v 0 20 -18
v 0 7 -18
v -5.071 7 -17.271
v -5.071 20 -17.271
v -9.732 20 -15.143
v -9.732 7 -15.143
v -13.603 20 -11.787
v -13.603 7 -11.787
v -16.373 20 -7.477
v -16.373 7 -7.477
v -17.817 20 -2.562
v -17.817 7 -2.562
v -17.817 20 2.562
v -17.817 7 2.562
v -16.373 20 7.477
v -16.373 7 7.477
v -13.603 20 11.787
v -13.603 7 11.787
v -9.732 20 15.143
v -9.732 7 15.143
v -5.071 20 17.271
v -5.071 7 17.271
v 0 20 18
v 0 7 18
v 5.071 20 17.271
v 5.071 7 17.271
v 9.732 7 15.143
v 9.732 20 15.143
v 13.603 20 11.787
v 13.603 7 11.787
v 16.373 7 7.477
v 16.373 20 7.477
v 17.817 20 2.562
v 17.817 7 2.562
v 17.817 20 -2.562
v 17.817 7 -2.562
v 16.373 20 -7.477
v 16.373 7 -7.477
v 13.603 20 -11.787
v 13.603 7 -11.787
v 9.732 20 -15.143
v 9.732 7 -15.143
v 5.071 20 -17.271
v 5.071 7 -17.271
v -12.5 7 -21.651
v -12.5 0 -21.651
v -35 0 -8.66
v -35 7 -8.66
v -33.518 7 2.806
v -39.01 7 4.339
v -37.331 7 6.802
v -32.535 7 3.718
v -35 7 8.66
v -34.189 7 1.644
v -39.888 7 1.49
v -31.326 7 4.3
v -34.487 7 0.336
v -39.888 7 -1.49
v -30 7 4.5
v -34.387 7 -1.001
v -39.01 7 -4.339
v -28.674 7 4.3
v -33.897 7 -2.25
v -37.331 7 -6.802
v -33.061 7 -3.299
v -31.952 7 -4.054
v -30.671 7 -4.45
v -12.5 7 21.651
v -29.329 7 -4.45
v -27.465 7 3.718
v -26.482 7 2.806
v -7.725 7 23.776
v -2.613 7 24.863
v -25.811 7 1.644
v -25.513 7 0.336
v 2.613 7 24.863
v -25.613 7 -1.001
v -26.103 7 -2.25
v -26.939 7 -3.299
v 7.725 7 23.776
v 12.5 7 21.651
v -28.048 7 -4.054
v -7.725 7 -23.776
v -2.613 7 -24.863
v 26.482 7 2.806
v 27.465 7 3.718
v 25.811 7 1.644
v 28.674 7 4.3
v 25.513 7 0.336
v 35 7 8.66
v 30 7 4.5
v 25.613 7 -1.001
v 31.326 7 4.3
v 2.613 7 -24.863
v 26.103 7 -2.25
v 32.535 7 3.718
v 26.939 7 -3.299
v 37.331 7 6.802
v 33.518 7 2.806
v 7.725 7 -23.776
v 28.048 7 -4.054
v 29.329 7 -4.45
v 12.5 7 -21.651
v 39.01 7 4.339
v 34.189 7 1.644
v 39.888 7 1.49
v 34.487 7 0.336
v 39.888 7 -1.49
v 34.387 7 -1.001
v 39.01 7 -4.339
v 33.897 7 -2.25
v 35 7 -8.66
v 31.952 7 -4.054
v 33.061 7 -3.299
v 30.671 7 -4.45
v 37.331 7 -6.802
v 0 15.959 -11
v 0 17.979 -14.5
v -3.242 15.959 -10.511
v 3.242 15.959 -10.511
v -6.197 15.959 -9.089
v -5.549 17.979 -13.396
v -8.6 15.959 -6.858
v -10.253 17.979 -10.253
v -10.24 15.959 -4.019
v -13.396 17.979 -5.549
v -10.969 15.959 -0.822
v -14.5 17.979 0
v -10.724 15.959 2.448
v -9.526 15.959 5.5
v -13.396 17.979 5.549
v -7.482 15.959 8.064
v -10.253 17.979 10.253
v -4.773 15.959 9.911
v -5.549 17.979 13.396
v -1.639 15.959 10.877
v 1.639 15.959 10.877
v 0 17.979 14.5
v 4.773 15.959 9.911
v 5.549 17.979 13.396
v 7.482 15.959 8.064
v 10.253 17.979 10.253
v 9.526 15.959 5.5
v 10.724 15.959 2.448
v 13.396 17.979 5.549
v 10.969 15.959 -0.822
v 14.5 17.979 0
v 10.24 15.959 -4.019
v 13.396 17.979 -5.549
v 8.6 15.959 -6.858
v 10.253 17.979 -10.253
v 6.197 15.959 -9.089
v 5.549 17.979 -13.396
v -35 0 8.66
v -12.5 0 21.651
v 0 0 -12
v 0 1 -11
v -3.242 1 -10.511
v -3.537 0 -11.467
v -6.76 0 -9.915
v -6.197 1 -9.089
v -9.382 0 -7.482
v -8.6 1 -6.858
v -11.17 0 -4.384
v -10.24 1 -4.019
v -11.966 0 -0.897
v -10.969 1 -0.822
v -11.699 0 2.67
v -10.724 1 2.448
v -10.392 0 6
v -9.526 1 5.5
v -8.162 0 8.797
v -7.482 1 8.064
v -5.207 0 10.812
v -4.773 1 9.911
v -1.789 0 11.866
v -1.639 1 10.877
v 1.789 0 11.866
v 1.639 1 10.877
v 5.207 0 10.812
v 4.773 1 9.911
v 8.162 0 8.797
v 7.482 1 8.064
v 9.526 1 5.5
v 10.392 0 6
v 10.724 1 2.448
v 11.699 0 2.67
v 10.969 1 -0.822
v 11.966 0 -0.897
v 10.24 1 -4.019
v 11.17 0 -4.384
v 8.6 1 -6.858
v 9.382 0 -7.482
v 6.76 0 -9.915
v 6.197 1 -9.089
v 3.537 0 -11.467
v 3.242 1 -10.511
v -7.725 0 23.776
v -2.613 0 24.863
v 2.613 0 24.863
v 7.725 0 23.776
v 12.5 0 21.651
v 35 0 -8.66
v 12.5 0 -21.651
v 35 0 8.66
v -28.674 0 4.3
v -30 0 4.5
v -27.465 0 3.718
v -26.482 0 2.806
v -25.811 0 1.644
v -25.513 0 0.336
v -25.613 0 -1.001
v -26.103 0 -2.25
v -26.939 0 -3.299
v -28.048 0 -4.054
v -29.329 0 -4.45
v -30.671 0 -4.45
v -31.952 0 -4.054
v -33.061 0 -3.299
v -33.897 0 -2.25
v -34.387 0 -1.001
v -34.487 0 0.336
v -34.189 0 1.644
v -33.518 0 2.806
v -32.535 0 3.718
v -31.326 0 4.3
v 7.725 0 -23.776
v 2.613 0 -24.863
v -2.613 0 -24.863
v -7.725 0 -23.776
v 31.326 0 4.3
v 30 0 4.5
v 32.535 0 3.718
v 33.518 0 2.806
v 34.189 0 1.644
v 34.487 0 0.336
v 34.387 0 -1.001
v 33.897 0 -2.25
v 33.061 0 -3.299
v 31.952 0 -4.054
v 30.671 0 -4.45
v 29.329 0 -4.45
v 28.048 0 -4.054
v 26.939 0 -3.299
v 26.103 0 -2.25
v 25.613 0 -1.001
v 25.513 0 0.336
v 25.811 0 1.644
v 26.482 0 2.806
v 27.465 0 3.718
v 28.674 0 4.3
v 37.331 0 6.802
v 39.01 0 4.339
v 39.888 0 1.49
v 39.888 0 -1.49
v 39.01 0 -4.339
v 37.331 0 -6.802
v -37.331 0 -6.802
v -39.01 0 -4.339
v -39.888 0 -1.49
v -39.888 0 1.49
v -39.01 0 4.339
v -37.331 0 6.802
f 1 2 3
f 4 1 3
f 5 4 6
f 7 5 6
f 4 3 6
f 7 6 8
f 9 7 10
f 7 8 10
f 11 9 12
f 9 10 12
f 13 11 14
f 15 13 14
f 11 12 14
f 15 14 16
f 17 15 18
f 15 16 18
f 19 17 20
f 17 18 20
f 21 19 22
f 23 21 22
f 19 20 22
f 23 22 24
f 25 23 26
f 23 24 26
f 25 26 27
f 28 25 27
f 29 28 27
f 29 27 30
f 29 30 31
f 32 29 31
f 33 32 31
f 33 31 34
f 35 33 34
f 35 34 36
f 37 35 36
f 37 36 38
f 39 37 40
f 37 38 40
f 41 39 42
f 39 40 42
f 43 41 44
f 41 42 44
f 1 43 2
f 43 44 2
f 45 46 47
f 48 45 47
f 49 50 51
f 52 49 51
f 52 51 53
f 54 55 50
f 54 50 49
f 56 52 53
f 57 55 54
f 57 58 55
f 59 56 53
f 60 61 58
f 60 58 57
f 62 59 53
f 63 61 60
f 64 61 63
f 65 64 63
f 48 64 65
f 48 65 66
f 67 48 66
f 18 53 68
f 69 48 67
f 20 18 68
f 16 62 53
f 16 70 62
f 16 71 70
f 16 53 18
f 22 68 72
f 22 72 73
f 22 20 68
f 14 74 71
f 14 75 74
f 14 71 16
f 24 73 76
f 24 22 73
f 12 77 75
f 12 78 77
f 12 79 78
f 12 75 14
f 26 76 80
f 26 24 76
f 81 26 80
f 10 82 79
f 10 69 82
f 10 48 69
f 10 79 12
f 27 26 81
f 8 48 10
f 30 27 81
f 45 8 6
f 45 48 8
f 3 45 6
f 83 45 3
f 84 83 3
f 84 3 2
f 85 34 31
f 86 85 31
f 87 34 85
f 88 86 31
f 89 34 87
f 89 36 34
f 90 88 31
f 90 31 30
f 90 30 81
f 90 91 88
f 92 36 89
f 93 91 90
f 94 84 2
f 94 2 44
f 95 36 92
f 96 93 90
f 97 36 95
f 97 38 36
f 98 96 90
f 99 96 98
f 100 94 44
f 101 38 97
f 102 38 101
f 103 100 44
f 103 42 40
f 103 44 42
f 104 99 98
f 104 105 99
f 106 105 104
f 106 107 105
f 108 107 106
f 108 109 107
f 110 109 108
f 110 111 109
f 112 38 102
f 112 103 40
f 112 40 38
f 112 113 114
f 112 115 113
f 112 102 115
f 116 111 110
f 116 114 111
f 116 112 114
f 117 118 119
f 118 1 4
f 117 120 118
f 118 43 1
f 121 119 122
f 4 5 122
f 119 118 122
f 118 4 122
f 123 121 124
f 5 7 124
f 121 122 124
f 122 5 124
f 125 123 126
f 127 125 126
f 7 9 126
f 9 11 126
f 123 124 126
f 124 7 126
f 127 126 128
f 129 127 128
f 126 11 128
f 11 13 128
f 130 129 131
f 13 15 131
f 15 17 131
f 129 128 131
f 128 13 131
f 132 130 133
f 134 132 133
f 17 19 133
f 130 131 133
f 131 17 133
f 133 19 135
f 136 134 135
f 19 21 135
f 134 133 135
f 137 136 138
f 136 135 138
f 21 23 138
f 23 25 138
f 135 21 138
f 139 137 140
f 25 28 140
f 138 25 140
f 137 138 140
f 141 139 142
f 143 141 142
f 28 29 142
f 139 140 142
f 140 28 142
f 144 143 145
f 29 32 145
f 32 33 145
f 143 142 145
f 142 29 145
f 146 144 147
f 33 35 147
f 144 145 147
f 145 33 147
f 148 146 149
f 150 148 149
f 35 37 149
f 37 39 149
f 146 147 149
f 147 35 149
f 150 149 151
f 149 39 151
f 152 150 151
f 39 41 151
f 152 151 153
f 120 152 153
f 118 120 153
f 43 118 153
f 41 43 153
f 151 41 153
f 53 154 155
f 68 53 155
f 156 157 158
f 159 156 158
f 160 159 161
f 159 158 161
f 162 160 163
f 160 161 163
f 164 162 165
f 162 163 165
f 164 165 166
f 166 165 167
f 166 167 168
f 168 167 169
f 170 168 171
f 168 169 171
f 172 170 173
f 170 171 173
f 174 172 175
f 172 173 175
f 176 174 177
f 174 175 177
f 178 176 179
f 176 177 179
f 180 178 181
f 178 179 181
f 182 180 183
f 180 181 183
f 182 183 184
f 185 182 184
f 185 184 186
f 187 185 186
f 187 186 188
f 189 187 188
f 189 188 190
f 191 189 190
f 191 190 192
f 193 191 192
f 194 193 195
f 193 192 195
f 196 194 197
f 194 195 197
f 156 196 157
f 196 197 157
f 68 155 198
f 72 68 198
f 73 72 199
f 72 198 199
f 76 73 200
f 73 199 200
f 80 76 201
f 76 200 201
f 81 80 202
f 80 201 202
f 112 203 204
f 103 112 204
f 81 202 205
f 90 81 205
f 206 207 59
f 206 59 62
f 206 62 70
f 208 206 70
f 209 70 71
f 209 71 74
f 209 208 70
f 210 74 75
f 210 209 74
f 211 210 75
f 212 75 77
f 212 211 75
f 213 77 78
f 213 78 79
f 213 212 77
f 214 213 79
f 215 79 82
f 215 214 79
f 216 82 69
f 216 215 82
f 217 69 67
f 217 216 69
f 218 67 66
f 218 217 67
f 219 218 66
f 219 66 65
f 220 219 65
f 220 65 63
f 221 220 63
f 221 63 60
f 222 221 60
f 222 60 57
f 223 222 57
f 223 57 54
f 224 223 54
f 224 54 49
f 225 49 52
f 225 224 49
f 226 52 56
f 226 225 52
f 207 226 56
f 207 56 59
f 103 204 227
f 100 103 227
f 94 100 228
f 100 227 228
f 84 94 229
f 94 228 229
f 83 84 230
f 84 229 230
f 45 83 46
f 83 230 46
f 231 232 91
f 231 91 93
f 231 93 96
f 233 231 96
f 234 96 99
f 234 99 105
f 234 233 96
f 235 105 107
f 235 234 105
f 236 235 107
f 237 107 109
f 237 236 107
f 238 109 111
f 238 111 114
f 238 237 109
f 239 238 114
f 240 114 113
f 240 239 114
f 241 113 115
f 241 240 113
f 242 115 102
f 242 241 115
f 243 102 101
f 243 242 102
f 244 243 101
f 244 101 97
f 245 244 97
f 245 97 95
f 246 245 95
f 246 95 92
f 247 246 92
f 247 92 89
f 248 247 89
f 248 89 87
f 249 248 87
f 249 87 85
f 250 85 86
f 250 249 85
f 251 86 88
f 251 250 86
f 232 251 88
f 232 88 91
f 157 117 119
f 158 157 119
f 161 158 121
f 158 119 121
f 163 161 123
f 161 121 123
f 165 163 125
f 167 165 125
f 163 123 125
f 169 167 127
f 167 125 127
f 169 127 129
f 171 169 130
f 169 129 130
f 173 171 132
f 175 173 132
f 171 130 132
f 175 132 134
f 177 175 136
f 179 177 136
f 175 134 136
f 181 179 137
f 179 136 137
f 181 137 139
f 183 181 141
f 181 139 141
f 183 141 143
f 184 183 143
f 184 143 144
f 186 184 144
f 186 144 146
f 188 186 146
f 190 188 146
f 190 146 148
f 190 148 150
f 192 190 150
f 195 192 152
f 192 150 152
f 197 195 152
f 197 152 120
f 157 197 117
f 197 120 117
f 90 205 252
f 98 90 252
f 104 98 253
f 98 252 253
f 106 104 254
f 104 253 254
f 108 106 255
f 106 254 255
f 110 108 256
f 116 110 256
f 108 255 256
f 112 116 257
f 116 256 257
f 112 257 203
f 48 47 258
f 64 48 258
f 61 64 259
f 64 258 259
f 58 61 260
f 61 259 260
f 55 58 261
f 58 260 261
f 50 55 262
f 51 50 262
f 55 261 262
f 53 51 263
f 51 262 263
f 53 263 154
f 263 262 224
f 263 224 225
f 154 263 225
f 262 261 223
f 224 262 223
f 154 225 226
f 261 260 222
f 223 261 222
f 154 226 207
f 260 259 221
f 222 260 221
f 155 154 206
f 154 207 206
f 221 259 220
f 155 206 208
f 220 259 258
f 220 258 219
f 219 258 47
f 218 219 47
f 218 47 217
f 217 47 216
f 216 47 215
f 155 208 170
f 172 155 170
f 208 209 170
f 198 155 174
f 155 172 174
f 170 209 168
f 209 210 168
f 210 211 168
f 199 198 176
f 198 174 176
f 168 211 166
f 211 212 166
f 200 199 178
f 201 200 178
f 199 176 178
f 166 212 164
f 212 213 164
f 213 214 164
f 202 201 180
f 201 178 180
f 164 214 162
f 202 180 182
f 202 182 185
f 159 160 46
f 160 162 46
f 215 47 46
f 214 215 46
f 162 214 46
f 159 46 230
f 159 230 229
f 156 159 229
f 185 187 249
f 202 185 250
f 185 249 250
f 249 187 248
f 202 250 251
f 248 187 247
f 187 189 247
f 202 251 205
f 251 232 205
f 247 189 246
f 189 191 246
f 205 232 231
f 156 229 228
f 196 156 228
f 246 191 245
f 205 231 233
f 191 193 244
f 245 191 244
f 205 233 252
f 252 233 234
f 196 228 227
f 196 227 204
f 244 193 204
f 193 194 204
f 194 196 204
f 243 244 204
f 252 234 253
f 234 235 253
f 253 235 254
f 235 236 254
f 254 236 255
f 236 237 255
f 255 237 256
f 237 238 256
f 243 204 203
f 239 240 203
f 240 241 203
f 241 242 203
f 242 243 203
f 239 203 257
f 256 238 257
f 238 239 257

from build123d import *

# Parameters (mm, degrees)
SKETCH_2_R      = 4.5
EXTRUDE_1_DEPTH = 7
SKETCH_3_R      = 18
EXTRUDE_2_DEPTH = 13
CHAMFER_1_SIZE  = 1


with BuildPart() as part:
    # 草图2 → 拉伸1 (new body)
    with BuildSketch(Plane(origin=(0, 0, 0), x_dir=(1, 0, 0), z_dir=(0, 1, 0))):
        with BuildLine():
            Line((-12.5, 21.650635095), (-35, 8.660254038))
            ThreePointArc((-35, 8.660254038), (-40, 0), (-35, -8.660254038))
            Line((-35, -8.660254038), (-12.5, -21.650635095))
            ThreePointArc((-12.5, -21.650635095), (0, -25), (12.5, -21.650635095))
            Line((12.5, -21.650635095), (35, -8.660254038))
            ThreePointArc((35, -8.660254038), (40, 0), (35, 8.660254038))
            Line((35, 8.660254038), (12.5, 21.650635095))
            ThreePointArc((12.5, 21.650635095), (0, 25), (-12.5, 21.650635095))
        make_face()
        with Locations(Location((-30, 0, 0), (0, 0, 270))):
            Circle(SKETCH_2_R, mode=Mode.SUBTRACT)
        with Locations(Location((30, 0, 0), (0, 0, 270))):
            Circle(SKETCH_2_R, mode=Mode.SUBTRACT)
    extrude(amount=EXTRUDE_1_DEPTH)

    # 草图3 → 拉伸2 (add)
    with BuildSketch(Plane(origin=(0, 7, 0), x_dir=(1, 0, 0), z_dir=(0, 1, 0))):
        with Locations(Location((0, 0, 0), (0, 0, 90))):
            Circle(SKETCH_3_R)
    extrude(amount=EXTRUDE_2_DEPTH)

    # 草图4 → 切除-旋转2 (revolve, cut)
    with BuildSketch(Plane(origin=(0, 20, 0), x_dir=(1, 0, 0), z_dir=(0, 0, -1)), mode=Mode.PRIVATE) as cut_revolve_2_sk:
        Polygon((0, 20), (11, 20), (11, 4.041451884), (18, 0), (0, 0), align=None)
    revolve(cut_revolve_2_sk.sketch.rotate(Axis((0, -9.575798304, 0), (0, 1, 0)), 90), axis=Axis((0, -9.575798304, 0), (0, 1, 0)), mode=Mode.SUBTRACT)

    # 倒角1
    chamfer_1_edges = [part.edges().sort_by_distance(p)[0] for p in [
        (0, 0, 11),
    ]]
    chamfer(chamfer_1_edges, length=CHAMFER_1_SIZE)


solid = part.part
